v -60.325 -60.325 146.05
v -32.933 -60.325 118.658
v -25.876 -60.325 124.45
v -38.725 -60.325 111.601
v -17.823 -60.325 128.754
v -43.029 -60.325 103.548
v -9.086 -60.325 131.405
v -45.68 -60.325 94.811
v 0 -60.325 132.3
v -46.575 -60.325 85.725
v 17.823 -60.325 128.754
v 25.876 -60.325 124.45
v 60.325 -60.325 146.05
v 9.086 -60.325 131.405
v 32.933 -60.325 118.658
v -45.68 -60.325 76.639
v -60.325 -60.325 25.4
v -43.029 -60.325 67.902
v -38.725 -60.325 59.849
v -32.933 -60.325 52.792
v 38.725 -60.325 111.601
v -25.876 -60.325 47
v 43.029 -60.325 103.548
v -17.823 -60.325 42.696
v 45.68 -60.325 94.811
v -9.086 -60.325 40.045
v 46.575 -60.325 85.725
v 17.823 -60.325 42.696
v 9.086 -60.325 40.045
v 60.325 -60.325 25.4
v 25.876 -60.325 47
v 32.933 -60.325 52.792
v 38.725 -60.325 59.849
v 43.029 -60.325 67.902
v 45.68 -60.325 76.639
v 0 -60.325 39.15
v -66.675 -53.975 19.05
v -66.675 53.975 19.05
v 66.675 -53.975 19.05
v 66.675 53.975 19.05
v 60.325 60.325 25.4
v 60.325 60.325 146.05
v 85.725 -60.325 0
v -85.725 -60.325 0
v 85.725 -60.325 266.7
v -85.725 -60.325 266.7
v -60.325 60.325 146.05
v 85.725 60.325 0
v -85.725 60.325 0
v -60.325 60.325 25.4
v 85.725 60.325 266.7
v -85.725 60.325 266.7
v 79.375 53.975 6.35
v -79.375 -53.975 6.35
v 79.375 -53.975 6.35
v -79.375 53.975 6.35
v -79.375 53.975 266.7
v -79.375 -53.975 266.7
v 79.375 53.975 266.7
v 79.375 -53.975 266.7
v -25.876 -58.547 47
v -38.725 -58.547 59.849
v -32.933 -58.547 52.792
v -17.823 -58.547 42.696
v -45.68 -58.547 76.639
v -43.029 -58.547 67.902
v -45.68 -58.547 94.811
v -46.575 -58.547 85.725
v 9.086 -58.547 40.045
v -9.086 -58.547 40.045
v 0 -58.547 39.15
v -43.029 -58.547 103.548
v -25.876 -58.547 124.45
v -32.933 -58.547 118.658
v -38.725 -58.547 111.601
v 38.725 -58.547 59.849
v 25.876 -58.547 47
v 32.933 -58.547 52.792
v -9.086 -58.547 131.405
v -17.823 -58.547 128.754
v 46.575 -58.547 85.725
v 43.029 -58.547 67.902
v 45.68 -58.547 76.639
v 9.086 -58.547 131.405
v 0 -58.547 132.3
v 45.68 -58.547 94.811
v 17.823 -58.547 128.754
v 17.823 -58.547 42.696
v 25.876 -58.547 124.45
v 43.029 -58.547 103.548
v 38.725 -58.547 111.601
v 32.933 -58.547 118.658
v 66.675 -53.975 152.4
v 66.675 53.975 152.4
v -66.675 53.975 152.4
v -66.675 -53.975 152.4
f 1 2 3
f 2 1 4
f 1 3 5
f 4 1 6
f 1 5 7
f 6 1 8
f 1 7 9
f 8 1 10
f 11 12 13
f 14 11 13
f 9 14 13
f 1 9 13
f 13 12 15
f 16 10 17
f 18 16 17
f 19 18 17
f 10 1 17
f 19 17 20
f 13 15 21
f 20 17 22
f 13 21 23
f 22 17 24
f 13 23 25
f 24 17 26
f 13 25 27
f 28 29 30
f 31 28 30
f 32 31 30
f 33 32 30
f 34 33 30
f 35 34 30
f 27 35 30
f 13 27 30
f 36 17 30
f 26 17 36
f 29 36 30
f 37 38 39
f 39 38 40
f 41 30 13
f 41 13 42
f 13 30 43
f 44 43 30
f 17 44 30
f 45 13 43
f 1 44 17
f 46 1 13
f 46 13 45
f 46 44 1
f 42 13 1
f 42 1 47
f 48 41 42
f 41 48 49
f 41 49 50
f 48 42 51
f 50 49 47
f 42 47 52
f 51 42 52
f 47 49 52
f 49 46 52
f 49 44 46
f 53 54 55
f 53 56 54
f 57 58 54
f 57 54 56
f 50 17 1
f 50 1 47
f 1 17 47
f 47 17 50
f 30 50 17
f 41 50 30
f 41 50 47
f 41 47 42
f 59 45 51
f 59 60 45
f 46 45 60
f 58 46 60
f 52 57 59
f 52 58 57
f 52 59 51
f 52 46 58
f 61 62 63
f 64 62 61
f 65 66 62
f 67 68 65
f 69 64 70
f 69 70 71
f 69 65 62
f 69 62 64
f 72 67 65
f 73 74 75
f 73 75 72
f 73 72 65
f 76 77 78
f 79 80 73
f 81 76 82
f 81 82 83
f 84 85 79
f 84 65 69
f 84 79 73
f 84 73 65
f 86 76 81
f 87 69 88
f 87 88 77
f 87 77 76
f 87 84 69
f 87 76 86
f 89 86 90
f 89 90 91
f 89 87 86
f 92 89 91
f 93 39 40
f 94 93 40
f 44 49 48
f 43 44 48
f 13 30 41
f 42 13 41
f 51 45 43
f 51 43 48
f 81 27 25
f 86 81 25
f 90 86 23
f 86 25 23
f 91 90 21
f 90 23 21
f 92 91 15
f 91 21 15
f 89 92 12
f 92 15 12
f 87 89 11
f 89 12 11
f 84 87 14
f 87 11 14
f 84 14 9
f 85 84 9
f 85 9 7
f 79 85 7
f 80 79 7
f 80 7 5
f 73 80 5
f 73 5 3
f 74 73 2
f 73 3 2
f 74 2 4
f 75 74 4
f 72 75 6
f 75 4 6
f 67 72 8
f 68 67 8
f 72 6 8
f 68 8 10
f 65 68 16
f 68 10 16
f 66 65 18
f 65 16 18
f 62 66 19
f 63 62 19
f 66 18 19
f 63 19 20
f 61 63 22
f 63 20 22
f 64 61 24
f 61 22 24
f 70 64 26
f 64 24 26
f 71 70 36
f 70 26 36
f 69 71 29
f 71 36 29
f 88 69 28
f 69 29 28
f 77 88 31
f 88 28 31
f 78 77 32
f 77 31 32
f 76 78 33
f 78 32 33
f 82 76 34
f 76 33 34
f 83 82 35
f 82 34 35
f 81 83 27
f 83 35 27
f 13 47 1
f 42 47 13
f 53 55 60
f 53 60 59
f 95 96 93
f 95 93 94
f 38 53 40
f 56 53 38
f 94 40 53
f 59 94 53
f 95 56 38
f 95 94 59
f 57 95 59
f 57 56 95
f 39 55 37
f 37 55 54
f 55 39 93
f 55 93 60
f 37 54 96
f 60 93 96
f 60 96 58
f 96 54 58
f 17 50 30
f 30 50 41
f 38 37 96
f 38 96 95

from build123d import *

# Parameters (mm, degrees)
F0_W      = 120.65
F0_H      = 120.65
F1_DEPTH  = 120.65
F2_R      = 46.5747584451
F3_DEPTH  = 1.778
F5_W      = 171.45
F5_H      = 120.65
F6_DEPTH  = 25.4
F7_W      = 25.4
F7_H      = 120.65
F8_DEPTH  = 120.65
F9_DEPTH  = 120.65
F10_W     = 120.65
F10_H     = 120.65
F11_DEPTH = 120.65
F12_T     = -6.35


with BuildPart() as f1:
    # F0 (on Top) → F1 (new body)
    with BuildSketch(Plane.XY):
        Rectangle(F0_W, F0_H)
    extrude(amount=F1_DEPTH)

    # F2 (on face) → F3 (cut)
    with BuildSketch(Plane.XZ.offset(60.325)):
        with Locations((0, 60.325)):
            Circle(F2_R)
    extrude(amount=-F3_DEPTH, mode=Mode.SUBTRACT)


with BuildPart() as f1_1:
    # F4: moved
    add(f1.part.moved(Location((0, 0, 25.4))))


with BuildPart() as f6:
    # F5 (on Top) → F6 (new body)
    with BuildSketch(Plane.XY):
        Rectangle(F5_W, F5_H)
    extrude(amount=F6_DEPTH)

    # F7 (on face) → F8 (join)
    with BuildSketch(Plane.XY.offset(25.4)):
        with Locations((-73.025, 0)):
            Rectangle(F7_W, F7_H)
        with Locations((73.025, 0)):
            Rectangle(F7_W, F7_H)
    extrude(amount=F8_DEPTH)

    # F9 (add): faces of the model
    f9_faces = [f6.faces().sort_by_distance(p)[0] for p in [
        (-73.025, 0, 146.05),
        (73.025, 0, 146.05),
    ]]
    extrude(f9_faces, amount=F9_DEPTH)

    # F10 (on face) → F11 (join)
    with BuildSketch(Plane.YZ.offset(-60.325)):
        with Locations((0, 206.375)):
            Rectangle(F10_W, F10_H)
    extrude(amount=F11_DEPTH)

    # F12
    f12_openings = [f6.faces().sort_by_distance(p)[0] for p in [
        (0, 0, 266.7),
    ]]
    offset(amount=F12_T, openings=f12_openings, kind=Kind.INTERSECTION)


solid = Compound([f1_1.part, f6.part])
